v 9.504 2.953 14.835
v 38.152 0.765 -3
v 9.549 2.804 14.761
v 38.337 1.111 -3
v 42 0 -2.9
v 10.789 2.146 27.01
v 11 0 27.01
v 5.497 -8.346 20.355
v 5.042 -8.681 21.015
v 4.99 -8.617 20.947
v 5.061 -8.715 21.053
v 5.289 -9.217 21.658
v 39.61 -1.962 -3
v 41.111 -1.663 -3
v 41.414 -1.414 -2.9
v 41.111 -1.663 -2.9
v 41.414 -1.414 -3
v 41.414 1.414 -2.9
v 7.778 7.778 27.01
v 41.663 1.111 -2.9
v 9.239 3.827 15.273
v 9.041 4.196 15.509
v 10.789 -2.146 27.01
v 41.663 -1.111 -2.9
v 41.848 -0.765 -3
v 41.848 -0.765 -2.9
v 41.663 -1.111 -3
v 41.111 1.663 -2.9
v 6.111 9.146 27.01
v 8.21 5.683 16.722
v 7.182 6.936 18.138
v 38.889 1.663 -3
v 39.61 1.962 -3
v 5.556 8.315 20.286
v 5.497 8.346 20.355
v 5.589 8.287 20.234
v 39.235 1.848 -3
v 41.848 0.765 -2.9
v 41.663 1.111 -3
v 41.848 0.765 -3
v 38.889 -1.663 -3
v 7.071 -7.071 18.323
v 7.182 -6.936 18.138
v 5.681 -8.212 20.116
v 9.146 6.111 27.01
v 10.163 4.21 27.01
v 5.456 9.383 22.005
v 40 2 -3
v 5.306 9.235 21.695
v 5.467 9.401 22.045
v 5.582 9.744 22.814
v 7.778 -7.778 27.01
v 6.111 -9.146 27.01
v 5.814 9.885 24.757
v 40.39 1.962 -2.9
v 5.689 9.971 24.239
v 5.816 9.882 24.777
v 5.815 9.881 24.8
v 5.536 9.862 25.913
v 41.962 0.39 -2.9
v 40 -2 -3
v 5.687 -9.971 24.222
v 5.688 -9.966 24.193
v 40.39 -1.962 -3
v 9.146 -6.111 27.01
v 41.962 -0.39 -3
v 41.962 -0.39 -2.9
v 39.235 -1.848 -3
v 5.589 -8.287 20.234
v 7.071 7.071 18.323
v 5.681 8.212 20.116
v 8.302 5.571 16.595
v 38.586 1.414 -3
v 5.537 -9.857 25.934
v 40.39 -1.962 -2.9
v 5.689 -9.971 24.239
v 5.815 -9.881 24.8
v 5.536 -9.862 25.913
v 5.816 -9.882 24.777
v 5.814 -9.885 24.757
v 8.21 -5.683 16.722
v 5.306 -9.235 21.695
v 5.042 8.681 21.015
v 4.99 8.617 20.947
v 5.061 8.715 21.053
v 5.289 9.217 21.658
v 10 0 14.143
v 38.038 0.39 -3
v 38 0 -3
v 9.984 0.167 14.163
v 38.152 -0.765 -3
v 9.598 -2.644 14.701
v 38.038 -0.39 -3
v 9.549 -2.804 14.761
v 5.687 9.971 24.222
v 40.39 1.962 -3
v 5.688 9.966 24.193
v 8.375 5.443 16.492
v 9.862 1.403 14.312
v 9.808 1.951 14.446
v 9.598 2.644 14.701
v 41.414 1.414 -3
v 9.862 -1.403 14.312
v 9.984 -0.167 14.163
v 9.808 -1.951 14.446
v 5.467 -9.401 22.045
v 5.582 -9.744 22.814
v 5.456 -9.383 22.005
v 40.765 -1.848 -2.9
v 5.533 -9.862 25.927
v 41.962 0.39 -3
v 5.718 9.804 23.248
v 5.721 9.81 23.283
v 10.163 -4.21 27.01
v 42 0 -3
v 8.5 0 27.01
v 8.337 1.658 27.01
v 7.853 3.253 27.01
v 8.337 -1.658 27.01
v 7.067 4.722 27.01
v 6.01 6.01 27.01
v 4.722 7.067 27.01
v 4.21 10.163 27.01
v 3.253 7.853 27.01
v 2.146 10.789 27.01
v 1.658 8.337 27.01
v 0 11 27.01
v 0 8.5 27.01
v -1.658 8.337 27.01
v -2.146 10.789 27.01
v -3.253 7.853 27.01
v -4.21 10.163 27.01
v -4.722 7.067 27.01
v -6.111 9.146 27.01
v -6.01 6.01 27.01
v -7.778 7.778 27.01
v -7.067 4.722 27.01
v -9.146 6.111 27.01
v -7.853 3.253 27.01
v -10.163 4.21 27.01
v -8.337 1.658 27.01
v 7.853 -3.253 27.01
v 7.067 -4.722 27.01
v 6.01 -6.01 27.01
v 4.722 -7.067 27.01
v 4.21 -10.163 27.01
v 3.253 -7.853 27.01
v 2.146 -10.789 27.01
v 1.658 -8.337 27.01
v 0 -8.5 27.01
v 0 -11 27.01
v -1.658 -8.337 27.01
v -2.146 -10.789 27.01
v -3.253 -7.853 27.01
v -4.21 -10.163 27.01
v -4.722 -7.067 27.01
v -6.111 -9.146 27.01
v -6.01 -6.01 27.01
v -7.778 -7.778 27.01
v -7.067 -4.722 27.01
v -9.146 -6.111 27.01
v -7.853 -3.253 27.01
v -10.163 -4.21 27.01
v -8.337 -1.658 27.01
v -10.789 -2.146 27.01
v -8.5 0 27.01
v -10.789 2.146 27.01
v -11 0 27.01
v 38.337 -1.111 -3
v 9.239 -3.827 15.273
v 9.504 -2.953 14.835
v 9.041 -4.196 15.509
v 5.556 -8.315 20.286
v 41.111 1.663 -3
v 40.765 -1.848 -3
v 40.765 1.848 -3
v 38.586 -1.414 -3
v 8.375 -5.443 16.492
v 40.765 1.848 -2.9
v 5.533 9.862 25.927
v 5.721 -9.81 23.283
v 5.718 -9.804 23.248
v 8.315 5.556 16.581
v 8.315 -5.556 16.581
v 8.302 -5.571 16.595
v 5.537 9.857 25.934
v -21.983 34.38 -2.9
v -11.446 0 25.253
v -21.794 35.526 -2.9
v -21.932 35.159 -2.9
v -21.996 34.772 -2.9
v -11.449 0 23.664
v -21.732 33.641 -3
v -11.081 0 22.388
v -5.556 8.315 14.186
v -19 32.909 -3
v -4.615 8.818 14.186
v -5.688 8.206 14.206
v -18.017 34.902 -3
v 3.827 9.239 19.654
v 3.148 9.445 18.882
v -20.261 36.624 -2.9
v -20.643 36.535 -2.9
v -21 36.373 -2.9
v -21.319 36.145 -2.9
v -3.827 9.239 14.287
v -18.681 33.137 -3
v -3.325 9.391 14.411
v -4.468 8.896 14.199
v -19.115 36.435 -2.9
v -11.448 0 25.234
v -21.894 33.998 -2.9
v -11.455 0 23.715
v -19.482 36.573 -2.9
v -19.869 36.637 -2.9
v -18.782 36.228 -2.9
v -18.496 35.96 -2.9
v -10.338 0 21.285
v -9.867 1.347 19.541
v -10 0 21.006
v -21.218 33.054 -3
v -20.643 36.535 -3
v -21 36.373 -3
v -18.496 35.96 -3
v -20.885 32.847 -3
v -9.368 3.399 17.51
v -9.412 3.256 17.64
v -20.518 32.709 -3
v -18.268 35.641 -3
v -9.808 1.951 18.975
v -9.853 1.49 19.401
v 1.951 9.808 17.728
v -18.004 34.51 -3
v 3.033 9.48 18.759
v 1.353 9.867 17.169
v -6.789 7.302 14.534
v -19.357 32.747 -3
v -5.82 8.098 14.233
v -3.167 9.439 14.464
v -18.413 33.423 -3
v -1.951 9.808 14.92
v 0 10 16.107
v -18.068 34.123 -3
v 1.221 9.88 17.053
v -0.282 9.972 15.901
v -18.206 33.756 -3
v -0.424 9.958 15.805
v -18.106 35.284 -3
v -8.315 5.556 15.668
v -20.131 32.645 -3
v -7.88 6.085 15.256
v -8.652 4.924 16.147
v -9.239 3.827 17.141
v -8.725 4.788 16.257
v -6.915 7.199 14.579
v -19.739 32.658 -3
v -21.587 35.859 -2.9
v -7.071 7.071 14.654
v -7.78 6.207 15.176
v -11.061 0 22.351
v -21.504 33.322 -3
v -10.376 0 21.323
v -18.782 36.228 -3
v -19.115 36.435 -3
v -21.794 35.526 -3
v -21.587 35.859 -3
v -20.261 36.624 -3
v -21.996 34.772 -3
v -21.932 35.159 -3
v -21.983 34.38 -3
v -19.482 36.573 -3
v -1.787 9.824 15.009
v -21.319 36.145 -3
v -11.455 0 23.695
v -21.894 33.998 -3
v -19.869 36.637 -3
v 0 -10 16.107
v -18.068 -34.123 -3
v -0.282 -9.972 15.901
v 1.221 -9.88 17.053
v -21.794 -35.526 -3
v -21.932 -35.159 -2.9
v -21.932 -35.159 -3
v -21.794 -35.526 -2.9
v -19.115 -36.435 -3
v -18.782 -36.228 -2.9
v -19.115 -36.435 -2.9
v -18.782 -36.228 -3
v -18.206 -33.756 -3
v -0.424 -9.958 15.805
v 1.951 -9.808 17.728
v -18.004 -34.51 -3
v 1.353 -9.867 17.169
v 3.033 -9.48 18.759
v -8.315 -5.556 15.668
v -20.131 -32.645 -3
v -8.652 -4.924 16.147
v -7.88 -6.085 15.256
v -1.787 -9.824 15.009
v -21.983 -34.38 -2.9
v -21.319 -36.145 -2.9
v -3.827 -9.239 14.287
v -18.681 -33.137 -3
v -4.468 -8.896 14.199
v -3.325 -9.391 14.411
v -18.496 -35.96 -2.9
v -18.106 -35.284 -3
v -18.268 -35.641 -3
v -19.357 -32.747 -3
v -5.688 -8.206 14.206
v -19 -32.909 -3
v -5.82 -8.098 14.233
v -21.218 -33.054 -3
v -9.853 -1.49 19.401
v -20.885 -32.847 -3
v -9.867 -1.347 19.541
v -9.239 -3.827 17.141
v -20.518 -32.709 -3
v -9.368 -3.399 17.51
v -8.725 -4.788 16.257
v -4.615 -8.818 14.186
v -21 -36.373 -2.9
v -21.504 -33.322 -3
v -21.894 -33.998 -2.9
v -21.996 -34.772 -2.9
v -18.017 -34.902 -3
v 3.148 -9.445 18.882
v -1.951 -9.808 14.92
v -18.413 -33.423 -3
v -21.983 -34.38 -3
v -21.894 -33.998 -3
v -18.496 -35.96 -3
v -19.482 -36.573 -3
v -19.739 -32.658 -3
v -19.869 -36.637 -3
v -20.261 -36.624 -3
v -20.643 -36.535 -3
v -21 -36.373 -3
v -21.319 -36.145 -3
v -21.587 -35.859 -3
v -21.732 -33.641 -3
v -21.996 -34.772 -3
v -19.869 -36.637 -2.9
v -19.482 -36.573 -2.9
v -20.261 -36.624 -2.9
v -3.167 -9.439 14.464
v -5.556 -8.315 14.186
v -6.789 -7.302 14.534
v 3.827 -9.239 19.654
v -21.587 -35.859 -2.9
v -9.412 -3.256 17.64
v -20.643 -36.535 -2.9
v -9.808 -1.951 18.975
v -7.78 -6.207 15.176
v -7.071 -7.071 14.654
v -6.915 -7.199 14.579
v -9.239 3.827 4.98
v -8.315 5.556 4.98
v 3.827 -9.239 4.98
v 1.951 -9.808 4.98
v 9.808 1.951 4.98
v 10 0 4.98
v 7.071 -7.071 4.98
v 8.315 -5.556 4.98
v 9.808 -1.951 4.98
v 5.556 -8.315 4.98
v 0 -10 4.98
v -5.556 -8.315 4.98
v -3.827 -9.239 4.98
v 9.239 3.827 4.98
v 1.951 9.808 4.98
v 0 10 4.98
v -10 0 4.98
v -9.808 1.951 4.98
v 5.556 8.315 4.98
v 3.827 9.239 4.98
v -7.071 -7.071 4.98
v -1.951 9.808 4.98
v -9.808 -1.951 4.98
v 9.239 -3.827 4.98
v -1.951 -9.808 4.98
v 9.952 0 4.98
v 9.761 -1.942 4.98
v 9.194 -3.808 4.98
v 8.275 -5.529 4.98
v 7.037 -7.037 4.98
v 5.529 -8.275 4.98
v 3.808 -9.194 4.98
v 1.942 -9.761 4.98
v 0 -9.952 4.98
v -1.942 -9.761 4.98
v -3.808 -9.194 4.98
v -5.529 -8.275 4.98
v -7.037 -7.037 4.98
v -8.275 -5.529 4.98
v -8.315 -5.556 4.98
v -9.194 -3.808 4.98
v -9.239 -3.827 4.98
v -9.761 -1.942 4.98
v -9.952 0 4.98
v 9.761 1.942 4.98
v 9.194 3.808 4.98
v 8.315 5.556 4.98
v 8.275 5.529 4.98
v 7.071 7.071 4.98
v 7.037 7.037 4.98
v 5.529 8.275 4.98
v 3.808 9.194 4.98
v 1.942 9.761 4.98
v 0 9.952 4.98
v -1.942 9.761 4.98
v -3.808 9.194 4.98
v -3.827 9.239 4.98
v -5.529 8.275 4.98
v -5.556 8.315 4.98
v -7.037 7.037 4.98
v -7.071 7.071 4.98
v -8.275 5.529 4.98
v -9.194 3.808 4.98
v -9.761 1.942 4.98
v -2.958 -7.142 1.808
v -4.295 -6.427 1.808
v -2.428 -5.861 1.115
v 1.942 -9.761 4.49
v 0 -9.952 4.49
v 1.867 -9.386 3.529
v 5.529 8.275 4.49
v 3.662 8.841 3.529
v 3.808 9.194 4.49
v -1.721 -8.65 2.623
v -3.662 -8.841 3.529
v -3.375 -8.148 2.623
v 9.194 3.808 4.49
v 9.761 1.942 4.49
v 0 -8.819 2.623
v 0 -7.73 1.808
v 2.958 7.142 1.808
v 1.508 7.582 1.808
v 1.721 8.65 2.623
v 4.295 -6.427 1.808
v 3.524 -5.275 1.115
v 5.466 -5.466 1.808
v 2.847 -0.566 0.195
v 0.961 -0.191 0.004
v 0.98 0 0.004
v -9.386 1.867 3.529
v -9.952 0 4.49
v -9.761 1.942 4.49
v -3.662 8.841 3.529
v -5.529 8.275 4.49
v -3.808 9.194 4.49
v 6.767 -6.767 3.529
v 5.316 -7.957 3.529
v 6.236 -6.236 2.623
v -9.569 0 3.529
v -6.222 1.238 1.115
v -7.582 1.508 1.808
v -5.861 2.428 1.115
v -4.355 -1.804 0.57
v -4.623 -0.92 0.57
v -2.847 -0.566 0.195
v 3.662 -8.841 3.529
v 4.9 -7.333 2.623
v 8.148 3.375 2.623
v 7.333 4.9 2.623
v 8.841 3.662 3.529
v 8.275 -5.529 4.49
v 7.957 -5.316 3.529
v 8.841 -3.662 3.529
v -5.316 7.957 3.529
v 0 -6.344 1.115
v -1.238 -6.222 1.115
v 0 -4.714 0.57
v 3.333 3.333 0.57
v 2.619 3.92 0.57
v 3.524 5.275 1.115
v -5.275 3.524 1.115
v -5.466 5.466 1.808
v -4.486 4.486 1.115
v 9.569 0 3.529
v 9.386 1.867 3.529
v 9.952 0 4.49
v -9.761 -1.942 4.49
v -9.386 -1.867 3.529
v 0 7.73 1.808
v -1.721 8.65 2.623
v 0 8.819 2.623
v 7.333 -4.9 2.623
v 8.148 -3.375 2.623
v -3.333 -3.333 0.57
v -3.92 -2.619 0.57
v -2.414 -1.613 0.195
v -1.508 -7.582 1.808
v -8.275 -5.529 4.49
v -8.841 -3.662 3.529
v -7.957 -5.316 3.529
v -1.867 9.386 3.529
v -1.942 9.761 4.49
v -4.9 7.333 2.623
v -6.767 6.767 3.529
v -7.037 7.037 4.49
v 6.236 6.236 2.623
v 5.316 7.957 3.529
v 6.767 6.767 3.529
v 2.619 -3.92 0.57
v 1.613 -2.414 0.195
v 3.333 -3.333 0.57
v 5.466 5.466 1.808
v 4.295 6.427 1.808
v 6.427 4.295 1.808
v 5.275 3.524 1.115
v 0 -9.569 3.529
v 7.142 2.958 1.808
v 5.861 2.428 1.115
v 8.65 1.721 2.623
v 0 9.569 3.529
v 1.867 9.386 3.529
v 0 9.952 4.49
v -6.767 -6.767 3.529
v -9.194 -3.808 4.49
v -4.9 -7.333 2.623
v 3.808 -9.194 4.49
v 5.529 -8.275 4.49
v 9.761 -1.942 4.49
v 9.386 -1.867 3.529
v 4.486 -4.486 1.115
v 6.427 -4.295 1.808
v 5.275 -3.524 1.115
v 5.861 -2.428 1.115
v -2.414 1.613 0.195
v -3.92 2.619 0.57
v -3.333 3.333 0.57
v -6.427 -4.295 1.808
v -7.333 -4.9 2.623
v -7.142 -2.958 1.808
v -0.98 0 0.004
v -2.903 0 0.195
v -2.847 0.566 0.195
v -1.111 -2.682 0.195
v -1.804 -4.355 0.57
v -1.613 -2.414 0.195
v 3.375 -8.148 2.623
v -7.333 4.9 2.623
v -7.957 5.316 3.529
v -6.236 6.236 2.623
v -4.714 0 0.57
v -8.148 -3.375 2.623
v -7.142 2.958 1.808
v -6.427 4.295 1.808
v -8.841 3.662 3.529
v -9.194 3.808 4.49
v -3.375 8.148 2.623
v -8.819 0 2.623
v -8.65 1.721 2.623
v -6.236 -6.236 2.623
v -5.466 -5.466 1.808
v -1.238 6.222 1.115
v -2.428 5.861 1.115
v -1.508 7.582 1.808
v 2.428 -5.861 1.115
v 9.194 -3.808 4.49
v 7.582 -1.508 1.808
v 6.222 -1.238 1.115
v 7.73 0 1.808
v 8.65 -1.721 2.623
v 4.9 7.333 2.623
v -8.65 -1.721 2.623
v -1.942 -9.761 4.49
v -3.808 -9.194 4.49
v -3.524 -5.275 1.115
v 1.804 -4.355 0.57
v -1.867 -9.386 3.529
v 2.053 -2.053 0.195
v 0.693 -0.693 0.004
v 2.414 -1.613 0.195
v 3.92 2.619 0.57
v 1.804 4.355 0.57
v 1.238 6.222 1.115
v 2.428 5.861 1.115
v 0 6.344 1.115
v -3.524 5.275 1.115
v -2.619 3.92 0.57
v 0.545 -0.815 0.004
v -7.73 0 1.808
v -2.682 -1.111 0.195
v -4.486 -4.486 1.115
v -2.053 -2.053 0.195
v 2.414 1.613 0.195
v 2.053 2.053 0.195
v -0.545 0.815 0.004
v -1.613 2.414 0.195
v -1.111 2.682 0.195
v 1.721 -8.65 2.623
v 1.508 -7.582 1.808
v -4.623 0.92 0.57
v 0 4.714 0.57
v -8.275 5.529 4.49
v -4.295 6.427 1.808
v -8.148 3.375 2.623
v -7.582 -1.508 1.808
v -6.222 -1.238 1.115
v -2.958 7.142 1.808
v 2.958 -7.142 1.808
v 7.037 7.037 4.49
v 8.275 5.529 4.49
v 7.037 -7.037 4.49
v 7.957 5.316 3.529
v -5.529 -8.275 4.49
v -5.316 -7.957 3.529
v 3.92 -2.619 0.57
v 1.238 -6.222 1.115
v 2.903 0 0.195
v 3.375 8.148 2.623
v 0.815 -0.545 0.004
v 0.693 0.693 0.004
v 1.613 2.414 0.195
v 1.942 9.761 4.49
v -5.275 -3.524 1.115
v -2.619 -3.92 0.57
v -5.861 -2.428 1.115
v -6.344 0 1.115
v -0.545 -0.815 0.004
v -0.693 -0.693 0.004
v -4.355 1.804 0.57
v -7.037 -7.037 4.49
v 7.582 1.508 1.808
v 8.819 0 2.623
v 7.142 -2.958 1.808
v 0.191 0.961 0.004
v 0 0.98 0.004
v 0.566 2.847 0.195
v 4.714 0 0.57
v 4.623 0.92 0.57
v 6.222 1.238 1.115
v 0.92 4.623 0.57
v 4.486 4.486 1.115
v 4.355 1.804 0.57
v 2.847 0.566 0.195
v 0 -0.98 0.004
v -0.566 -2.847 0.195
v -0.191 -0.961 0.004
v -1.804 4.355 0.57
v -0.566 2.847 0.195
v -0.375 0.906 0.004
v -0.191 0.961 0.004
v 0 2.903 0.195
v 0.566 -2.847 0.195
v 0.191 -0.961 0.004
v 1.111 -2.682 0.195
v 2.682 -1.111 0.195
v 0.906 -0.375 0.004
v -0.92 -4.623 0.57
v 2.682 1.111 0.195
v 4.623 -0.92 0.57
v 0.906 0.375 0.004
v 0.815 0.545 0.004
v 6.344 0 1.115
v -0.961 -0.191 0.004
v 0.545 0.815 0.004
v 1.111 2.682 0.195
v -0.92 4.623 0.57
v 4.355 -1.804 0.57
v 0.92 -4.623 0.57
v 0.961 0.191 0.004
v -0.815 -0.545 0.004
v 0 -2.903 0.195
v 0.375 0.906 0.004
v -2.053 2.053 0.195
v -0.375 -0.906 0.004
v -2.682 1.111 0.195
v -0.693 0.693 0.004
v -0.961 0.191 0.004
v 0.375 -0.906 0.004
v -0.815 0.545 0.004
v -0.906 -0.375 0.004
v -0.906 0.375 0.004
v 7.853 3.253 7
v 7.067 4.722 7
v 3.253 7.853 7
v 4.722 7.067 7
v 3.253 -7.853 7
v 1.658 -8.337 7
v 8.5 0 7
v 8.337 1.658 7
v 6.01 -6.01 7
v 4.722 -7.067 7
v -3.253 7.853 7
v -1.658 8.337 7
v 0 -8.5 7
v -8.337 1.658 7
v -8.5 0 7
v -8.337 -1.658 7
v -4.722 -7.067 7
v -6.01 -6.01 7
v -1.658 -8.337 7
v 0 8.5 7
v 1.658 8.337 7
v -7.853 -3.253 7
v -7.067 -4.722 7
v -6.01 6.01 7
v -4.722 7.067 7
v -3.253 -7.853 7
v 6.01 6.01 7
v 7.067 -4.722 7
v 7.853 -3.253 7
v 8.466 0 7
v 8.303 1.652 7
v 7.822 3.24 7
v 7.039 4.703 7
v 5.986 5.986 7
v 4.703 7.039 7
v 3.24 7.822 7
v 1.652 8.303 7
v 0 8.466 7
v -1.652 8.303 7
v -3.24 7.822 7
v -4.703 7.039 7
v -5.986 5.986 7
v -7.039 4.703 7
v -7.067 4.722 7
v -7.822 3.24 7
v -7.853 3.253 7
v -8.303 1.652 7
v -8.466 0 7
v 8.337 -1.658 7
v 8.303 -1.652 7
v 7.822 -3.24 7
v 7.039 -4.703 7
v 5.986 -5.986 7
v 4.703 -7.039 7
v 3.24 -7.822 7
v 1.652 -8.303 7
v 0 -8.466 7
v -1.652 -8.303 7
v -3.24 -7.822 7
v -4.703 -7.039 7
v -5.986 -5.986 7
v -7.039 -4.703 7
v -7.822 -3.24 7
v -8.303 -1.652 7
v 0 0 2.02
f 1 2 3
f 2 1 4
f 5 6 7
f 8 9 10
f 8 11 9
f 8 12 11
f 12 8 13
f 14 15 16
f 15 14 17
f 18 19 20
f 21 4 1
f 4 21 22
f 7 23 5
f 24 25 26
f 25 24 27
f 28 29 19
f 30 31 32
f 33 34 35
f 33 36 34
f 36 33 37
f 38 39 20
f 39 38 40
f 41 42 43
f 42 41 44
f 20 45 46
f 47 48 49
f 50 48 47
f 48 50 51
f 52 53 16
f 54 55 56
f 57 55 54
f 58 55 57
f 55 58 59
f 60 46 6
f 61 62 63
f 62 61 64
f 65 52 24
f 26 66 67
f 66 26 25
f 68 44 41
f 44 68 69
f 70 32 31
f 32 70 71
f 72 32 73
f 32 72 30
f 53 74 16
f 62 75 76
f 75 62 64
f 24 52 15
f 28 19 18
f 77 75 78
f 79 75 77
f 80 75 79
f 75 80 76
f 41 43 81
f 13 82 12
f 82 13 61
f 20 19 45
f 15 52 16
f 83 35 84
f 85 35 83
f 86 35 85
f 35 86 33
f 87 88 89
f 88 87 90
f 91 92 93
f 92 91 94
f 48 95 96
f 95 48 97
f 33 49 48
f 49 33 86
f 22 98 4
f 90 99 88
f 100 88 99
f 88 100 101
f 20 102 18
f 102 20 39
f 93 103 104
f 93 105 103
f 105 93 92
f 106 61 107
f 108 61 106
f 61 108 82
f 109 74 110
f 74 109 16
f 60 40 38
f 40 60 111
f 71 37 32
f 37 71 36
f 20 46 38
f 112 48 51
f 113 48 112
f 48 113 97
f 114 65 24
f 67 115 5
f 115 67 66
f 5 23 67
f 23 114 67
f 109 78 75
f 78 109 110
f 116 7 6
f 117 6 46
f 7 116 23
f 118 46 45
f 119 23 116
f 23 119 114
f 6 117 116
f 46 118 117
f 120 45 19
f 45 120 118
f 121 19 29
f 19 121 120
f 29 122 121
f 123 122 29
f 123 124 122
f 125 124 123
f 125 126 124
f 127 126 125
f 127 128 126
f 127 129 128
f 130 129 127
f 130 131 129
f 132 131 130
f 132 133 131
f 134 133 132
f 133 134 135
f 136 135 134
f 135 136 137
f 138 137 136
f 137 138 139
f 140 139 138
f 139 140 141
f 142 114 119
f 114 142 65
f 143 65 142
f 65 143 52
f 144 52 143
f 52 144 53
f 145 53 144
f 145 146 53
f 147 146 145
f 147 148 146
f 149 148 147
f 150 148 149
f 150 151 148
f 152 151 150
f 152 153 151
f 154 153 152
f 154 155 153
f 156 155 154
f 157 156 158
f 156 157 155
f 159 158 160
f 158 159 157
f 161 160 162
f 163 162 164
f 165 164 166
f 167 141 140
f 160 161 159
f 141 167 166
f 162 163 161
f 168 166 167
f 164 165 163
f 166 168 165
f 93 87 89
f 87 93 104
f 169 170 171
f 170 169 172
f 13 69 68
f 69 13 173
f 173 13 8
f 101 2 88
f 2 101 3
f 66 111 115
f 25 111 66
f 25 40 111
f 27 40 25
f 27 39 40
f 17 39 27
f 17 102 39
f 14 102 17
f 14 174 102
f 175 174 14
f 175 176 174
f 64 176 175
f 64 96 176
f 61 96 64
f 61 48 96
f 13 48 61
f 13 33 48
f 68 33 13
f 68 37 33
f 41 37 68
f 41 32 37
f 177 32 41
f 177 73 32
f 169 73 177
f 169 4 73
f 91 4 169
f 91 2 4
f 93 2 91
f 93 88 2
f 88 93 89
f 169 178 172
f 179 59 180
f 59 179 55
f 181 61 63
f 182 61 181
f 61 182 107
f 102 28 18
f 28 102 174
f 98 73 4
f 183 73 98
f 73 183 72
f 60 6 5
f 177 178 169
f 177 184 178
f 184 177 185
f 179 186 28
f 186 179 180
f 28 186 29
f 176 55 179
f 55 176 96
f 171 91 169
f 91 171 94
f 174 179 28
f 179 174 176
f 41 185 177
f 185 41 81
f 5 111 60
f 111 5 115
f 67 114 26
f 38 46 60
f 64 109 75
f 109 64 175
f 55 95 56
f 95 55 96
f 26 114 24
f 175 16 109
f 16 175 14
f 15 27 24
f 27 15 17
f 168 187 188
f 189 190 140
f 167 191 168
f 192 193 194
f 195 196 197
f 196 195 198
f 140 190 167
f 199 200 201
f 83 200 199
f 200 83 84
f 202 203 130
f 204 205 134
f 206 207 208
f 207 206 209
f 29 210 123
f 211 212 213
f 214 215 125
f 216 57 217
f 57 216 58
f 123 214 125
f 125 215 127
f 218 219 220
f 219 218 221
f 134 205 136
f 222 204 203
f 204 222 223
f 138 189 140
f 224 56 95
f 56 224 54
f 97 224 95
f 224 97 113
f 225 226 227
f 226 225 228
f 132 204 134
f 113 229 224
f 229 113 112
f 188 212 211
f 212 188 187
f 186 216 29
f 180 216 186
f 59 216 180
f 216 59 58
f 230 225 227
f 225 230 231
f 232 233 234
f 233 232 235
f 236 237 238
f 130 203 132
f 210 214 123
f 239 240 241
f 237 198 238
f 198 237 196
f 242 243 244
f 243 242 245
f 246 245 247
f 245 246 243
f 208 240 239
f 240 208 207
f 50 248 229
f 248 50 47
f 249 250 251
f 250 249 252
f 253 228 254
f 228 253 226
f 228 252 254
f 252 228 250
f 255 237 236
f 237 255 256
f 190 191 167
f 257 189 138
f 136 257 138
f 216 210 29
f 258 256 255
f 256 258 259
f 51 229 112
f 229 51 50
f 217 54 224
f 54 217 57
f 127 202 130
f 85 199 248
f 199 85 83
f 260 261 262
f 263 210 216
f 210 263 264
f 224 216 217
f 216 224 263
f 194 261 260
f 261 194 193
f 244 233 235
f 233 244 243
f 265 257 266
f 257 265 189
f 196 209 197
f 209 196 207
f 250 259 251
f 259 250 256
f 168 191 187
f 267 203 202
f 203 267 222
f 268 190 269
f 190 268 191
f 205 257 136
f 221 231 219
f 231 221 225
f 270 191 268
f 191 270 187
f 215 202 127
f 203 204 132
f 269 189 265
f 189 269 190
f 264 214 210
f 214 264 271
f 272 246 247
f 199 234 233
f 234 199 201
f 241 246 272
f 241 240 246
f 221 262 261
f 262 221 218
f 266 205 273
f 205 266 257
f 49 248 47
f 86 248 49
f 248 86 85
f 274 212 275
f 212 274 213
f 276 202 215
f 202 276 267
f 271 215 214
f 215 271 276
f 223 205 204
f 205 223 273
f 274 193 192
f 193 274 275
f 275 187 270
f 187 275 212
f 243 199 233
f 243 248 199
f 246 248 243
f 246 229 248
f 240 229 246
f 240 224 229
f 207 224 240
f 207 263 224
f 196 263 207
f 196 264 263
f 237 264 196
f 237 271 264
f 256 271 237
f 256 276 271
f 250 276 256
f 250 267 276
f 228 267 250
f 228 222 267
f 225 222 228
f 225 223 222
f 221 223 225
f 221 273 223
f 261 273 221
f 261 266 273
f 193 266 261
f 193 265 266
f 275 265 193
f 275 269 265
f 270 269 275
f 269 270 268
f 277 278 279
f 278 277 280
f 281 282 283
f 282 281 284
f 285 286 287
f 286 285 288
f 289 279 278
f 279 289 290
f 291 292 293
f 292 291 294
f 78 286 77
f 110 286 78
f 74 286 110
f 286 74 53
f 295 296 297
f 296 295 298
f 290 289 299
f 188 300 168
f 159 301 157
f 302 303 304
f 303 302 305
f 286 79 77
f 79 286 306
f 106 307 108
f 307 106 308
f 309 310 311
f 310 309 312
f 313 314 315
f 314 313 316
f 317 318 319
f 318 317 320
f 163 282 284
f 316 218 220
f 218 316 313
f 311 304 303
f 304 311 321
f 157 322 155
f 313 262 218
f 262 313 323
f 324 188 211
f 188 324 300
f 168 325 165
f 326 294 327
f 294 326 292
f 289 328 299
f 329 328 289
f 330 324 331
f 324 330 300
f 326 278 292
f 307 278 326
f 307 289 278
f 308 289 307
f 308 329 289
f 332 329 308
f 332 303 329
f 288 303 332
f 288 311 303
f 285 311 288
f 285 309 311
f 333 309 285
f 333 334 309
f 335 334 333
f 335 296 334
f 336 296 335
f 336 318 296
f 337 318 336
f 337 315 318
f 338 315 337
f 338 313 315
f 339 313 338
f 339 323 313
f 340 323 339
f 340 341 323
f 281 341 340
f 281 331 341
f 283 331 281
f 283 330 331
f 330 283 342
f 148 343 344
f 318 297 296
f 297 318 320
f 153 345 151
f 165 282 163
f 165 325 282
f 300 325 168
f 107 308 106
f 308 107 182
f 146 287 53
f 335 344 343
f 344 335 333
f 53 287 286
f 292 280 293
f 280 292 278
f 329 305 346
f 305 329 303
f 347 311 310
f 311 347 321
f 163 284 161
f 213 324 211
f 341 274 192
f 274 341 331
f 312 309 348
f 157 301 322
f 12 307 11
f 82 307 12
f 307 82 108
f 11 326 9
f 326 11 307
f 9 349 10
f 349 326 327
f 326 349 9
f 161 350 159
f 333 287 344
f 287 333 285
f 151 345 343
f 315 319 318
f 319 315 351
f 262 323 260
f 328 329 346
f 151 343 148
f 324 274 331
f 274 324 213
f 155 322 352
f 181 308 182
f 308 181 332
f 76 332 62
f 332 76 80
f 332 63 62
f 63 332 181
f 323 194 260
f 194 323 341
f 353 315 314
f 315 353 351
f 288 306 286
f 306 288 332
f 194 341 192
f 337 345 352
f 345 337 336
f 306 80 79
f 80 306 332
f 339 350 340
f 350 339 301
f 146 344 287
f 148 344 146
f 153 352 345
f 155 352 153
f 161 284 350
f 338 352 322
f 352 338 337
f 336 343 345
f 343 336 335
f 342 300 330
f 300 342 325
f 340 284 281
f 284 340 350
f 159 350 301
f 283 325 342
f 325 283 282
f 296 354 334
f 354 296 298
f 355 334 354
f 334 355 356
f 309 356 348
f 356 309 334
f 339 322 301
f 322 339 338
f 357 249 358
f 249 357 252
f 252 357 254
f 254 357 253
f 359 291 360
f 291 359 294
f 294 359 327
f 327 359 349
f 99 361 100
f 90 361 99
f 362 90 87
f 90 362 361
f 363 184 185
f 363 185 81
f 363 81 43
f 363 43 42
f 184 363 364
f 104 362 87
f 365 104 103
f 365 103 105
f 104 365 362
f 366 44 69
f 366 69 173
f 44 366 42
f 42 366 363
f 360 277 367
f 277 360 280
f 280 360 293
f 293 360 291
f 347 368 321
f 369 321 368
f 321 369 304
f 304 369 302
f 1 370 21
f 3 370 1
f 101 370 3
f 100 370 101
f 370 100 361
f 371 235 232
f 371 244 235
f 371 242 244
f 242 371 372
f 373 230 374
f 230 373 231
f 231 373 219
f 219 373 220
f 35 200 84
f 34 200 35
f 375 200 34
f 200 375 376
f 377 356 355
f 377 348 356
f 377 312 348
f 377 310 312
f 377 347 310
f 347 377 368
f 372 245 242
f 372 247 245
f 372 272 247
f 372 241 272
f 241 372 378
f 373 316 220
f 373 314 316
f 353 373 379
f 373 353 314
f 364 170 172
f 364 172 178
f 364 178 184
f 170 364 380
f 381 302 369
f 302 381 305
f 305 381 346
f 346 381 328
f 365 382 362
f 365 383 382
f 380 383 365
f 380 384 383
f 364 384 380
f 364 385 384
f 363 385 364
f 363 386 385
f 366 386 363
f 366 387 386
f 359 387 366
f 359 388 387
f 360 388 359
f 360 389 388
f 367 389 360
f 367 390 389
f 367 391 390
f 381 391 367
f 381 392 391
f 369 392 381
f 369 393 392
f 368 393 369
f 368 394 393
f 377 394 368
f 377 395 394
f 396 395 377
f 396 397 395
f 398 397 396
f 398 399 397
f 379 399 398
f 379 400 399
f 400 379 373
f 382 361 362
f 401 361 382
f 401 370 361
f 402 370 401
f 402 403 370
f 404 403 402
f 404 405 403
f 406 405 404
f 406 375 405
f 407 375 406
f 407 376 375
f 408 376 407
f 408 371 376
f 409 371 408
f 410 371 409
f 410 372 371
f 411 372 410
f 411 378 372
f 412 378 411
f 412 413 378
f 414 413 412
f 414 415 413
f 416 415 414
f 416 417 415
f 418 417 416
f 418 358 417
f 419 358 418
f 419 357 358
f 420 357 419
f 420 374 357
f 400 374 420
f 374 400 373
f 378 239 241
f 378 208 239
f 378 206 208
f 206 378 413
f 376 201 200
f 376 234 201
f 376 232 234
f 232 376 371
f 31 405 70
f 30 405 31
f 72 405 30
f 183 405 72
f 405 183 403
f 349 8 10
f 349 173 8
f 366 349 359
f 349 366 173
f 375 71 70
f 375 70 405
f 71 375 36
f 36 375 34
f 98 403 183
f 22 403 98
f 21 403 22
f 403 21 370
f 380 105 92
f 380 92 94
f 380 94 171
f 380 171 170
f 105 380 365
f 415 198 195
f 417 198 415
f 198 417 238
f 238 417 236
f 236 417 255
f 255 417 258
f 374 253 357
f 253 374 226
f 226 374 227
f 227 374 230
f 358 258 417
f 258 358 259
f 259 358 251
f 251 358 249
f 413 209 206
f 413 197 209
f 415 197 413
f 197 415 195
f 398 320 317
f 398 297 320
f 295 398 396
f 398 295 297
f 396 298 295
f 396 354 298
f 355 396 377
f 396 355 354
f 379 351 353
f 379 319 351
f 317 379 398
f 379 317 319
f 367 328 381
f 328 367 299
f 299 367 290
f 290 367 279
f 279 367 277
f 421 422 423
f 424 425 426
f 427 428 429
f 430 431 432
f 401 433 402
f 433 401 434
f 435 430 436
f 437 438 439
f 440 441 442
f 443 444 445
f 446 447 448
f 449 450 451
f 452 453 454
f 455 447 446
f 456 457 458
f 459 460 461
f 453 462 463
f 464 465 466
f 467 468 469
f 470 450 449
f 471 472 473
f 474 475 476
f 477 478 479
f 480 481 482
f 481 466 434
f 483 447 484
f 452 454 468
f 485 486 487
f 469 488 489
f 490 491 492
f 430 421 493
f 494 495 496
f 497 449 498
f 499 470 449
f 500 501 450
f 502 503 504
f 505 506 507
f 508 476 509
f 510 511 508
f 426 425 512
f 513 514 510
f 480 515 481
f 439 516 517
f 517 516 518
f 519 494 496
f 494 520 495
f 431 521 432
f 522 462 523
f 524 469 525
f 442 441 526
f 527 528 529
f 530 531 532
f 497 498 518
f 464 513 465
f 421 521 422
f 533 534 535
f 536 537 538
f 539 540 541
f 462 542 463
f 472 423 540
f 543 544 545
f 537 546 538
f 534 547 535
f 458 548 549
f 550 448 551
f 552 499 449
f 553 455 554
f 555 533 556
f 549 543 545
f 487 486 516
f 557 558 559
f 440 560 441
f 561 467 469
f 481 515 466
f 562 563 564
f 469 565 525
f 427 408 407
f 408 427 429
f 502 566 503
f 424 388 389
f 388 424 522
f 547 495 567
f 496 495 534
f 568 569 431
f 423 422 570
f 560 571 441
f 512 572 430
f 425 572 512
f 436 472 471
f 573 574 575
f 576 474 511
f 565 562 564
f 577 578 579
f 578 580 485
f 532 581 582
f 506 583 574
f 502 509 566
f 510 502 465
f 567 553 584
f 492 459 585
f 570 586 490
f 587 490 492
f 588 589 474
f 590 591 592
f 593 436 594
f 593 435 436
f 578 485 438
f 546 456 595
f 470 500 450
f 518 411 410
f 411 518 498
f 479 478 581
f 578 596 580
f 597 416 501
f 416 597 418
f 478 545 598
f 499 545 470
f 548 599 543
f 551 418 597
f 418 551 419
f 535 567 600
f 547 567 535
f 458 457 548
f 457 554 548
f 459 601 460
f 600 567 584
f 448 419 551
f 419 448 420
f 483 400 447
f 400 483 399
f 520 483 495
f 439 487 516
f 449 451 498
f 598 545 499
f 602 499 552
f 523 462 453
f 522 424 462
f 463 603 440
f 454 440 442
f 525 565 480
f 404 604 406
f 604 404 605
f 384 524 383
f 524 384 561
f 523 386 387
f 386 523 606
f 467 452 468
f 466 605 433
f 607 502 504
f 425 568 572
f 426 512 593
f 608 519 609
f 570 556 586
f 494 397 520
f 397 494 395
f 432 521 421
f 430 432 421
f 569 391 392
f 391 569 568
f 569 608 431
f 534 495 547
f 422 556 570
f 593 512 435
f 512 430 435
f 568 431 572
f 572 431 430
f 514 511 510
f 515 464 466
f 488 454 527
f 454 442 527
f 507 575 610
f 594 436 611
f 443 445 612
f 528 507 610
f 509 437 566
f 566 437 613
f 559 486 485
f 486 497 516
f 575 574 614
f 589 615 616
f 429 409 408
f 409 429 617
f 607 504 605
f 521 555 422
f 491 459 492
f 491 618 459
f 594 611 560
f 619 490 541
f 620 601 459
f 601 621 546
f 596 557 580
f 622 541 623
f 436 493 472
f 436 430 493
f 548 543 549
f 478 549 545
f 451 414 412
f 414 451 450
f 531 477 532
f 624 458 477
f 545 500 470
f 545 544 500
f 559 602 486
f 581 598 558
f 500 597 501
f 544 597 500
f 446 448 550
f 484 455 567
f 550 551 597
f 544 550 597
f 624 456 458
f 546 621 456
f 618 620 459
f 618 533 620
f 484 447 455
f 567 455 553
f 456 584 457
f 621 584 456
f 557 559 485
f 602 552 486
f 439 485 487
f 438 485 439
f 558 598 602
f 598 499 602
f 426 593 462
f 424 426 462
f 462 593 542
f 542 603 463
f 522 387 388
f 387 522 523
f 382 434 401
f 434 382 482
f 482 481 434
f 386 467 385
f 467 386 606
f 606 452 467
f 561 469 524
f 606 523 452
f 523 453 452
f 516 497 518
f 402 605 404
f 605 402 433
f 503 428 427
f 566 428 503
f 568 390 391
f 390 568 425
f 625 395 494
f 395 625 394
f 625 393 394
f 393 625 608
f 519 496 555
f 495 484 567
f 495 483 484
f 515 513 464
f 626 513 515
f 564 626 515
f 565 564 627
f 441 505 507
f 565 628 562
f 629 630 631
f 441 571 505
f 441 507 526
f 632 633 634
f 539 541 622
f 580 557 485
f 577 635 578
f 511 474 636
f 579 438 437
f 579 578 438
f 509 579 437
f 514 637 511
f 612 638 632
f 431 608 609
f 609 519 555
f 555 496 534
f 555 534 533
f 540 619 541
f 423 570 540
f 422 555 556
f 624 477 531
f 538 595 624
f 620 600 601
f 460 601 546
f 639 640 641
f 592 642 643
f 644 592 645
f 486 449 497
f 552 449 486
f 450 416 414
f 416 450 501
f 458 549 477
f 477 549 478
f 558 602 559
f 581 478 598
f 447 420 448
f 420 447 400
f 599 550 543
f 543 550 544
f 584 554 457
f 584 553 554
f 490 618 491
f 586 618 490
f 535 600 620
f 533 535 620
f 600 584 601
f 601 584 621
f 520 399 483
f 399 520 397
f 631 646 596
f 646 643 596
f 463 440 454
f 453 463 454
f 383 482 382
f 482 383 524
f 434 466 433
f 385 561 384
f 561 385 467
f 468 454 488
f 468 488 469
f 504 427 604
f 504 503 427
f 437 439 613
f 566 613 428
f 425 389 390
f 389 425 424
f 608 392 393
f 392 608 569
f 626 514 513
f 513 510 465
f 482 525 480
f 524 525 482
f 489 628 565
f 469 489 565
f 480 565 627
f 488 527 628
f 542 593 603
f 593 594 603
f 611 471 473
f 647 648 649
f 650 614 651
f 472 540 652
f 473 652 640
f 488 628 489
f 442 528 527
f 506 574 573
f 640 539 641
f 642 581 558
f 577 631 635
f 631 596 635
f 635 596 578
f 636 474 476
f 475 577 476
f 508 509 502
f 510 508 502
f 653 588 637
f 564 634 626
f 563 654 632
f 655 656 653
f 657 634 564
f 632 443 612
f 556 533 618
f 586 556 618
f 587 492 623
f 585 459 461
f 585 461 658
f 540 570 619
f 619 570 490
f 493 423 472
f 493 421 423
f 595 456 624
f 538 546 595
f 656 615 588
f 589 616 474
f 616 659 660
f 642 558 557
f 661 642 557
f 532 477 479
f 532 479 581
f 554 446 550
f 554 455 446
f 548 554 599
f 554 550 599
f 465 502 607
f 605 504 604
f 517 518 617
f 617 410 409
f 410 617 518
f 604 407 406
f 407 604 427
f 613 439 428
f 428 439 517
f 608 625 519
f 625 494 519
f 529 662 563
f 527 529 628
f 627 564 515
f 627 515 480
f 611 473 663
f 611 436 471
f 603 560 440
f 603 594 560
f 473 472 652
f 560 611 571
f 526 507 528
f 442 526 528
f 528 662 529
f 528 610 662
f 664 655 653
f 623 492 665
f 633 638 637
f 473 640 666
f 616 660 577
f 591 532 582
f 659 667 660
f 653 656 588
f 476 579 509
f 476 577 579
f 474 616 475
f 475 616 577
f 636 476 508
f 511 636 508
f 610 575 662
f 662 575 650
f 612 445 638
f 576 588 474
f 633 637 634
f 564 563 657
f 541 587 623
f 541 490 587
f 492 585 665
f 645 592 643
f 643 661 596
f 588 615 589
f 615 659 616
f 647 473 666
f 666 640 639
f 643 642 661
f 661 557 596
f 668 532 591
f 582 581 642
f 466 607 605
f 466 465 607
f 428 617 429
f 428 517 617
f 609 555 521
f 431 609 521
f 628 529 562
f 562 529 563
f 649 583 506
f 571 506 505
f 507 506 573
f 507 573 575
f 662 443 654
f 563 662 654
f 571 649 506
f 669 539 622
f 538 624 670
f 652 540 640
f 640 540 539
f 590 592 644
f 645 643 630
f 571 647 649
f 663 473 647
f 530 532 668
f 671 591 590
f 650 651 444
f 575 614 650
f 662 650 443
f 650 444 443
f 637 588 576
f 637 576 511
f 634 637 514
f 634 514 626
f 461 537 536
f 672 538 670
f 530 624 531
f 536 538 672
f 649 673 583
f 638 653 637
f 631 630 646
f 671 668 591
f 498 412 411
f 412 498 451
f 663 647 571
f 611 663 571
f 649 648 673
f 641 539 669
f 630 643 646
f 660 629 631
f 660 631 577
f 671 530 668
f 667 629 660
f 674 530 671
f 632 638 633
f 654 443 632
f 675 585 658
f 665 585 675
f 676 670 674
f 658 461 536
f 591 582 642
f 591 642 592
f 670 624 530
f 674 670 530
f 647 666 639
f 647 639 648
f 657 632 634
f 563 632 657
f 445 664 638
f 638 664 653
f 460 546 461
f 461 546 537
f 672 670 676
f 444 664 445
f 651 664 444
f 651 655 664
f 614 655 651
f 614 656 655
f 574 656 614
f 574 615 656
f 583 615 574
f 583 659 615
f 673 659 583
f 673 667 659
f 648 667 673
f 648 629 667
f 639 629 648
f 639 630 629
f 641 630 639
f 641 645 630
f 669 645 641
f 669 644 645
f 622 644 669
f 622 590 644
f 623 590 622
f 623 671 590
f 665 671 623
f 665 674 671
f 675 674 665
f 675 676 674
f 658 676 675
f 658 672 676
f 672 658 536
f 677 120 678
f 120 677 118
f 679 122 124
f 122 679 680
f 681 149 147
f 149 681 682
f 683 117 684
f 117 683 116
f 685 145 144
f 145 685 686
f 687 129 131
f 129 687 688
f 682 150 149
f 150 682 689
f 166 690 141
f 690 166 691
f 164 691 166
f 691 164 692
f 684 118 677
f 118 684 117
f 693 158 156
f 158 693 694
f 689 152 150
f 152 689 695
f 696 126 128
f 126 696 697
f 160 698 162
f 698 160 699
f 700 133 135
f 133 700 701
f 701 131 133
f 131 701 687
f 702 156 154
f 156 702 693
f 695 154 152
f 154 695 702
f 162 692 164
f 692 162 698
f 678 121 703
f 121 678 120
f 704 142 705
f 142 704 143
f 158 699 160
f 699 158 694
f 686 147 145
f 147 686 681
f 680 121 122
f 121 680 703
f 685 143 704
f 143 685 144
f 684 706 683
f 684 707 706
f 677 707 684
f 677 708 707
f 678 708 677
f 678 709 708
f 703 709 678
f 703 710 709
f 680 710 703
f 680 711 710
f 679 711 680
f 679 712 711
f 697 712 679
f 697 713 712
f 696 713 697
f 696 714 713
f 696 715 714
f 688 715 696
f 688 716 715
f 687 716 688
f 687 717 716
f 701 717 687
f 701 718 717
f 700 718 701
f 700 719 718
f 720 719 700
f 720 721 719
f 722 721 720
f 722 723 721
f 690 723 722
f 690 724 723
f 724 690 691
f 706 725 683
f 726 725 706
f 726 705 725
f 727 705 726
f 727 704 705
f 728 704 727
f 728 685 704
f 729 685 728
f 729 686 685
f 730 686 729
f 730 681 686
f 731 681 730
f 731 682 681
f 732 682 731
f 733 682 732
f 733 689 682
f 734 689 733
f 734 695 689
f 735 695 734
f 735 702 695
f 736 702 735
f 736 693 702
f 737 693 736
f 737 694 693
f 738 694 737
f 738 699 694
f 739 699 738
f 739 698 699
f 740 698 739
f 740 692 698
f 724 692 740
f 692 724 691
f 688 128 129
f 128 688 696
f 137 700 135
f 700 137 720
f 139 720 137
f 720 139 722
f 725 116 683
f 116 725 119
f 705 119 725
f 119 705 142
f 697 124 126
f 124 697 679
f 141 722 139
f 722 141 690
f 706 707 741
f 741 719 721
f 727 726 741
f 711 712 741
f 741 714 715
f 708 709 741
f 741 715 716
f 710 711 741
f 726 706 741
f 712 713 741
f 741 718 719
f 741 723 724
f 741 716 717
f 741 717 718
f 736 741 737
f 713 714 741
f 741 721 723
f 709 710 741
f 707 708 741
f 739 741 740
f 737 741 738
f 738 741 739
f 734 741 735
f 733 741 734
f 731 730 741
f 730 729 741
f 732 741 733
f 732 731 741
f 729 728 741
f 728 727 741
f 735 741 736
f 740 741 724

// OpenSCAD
//
// porte cigarette électronique
//
// copyright 2014 Sébastien Roy
//
// Licence: public domain
//


/* [Basics] */

// Hole diameter (mm)
holeDiameter=16; // [4:40]

// Hole height (mm)
holeHeight=20; // [10:80]




/* [Thickness] */

// Thickness around the hole (mm)
thickness=2; // [1:10]

// Extra thickness around the top. This defines how the legs will look. >0 will make a larger top, and <0 will make the legs connect below the top.
topExtraThickness=1; // [-20:20]




/* [Legs] */

// Number of legs
nbLegs=3; // [1:8]

// Distance from leg base to center (mm)
legDistance=40; // [10:120]

// Diameter of the leg base (mm)
legDiameter=4; // [1:40]

// Space under the middle (mm)
bottomSpace=3; // [0:30]




/* [Rendering] */

// Cut the model in half to see inside
cut=0; // [0:No,1:Yes]

// Rotate the model for printing
rotate=0; // [0:No,1:Yes]

// Make the hole wider by 2*tolerance, (units are 1/10mm, so 5=0.5mm)
tolerance=5; // [0:20]

// Resolution of everything round
resolution=32; //  [16:Low,32:Normal,64:High,128:Super High]






module nop() { }

$fn=resolution;

clearance=(holeDiameter/2+thickness)/2+thickness;
echo(clearance);

topD=max(holeDiameter/2+thickness+topExtraThickness,1);
echo(topD);


module oneLeg(angle) {
	hull() {
		translate([0,0,holeHeight]) cylinder(r=topD,h=0.01);
		rotate([0,0,angle]) translate([legDistance,0,-clearance-bottomSpace]) cylinder(r=legDiameter/2,h=0.1);
	}
}

module externalCylinder() {
	translate([0,0,-thickness-0.02]) cylinder(r=holeDiameter/2+thickness,holeHeight+thickness);
	translate([0,0,-thickness-0.02]) scale([1,1,0.5]) sphere(r=holeDiameter/2+thickness);
}

module internalCylinder() {
	translate([0,0,0]) cylinder(r=holeDiameter/2+tolerance/10,h=holeHeight+0.02);
	translate([0,0,-clearance+thickness+0.02]) cylinder(r2=holeDiameter/2+0.5,r1=0,h=clearance-thickness);
}


module support() {
	difference() {
		union() {
			for( i=[0:360/nbLegs:359] ) { oneLeg(i); }
			externalCylinder();
		}
		internalCylinder();
	}
}


translate([0,0,clearance]) intersection() {
	if( cut ) translate([-50,0,-50]) cube([100,100,100]);
	if( rotate ) rotate([180,0,0]) support();
	else support();
}
